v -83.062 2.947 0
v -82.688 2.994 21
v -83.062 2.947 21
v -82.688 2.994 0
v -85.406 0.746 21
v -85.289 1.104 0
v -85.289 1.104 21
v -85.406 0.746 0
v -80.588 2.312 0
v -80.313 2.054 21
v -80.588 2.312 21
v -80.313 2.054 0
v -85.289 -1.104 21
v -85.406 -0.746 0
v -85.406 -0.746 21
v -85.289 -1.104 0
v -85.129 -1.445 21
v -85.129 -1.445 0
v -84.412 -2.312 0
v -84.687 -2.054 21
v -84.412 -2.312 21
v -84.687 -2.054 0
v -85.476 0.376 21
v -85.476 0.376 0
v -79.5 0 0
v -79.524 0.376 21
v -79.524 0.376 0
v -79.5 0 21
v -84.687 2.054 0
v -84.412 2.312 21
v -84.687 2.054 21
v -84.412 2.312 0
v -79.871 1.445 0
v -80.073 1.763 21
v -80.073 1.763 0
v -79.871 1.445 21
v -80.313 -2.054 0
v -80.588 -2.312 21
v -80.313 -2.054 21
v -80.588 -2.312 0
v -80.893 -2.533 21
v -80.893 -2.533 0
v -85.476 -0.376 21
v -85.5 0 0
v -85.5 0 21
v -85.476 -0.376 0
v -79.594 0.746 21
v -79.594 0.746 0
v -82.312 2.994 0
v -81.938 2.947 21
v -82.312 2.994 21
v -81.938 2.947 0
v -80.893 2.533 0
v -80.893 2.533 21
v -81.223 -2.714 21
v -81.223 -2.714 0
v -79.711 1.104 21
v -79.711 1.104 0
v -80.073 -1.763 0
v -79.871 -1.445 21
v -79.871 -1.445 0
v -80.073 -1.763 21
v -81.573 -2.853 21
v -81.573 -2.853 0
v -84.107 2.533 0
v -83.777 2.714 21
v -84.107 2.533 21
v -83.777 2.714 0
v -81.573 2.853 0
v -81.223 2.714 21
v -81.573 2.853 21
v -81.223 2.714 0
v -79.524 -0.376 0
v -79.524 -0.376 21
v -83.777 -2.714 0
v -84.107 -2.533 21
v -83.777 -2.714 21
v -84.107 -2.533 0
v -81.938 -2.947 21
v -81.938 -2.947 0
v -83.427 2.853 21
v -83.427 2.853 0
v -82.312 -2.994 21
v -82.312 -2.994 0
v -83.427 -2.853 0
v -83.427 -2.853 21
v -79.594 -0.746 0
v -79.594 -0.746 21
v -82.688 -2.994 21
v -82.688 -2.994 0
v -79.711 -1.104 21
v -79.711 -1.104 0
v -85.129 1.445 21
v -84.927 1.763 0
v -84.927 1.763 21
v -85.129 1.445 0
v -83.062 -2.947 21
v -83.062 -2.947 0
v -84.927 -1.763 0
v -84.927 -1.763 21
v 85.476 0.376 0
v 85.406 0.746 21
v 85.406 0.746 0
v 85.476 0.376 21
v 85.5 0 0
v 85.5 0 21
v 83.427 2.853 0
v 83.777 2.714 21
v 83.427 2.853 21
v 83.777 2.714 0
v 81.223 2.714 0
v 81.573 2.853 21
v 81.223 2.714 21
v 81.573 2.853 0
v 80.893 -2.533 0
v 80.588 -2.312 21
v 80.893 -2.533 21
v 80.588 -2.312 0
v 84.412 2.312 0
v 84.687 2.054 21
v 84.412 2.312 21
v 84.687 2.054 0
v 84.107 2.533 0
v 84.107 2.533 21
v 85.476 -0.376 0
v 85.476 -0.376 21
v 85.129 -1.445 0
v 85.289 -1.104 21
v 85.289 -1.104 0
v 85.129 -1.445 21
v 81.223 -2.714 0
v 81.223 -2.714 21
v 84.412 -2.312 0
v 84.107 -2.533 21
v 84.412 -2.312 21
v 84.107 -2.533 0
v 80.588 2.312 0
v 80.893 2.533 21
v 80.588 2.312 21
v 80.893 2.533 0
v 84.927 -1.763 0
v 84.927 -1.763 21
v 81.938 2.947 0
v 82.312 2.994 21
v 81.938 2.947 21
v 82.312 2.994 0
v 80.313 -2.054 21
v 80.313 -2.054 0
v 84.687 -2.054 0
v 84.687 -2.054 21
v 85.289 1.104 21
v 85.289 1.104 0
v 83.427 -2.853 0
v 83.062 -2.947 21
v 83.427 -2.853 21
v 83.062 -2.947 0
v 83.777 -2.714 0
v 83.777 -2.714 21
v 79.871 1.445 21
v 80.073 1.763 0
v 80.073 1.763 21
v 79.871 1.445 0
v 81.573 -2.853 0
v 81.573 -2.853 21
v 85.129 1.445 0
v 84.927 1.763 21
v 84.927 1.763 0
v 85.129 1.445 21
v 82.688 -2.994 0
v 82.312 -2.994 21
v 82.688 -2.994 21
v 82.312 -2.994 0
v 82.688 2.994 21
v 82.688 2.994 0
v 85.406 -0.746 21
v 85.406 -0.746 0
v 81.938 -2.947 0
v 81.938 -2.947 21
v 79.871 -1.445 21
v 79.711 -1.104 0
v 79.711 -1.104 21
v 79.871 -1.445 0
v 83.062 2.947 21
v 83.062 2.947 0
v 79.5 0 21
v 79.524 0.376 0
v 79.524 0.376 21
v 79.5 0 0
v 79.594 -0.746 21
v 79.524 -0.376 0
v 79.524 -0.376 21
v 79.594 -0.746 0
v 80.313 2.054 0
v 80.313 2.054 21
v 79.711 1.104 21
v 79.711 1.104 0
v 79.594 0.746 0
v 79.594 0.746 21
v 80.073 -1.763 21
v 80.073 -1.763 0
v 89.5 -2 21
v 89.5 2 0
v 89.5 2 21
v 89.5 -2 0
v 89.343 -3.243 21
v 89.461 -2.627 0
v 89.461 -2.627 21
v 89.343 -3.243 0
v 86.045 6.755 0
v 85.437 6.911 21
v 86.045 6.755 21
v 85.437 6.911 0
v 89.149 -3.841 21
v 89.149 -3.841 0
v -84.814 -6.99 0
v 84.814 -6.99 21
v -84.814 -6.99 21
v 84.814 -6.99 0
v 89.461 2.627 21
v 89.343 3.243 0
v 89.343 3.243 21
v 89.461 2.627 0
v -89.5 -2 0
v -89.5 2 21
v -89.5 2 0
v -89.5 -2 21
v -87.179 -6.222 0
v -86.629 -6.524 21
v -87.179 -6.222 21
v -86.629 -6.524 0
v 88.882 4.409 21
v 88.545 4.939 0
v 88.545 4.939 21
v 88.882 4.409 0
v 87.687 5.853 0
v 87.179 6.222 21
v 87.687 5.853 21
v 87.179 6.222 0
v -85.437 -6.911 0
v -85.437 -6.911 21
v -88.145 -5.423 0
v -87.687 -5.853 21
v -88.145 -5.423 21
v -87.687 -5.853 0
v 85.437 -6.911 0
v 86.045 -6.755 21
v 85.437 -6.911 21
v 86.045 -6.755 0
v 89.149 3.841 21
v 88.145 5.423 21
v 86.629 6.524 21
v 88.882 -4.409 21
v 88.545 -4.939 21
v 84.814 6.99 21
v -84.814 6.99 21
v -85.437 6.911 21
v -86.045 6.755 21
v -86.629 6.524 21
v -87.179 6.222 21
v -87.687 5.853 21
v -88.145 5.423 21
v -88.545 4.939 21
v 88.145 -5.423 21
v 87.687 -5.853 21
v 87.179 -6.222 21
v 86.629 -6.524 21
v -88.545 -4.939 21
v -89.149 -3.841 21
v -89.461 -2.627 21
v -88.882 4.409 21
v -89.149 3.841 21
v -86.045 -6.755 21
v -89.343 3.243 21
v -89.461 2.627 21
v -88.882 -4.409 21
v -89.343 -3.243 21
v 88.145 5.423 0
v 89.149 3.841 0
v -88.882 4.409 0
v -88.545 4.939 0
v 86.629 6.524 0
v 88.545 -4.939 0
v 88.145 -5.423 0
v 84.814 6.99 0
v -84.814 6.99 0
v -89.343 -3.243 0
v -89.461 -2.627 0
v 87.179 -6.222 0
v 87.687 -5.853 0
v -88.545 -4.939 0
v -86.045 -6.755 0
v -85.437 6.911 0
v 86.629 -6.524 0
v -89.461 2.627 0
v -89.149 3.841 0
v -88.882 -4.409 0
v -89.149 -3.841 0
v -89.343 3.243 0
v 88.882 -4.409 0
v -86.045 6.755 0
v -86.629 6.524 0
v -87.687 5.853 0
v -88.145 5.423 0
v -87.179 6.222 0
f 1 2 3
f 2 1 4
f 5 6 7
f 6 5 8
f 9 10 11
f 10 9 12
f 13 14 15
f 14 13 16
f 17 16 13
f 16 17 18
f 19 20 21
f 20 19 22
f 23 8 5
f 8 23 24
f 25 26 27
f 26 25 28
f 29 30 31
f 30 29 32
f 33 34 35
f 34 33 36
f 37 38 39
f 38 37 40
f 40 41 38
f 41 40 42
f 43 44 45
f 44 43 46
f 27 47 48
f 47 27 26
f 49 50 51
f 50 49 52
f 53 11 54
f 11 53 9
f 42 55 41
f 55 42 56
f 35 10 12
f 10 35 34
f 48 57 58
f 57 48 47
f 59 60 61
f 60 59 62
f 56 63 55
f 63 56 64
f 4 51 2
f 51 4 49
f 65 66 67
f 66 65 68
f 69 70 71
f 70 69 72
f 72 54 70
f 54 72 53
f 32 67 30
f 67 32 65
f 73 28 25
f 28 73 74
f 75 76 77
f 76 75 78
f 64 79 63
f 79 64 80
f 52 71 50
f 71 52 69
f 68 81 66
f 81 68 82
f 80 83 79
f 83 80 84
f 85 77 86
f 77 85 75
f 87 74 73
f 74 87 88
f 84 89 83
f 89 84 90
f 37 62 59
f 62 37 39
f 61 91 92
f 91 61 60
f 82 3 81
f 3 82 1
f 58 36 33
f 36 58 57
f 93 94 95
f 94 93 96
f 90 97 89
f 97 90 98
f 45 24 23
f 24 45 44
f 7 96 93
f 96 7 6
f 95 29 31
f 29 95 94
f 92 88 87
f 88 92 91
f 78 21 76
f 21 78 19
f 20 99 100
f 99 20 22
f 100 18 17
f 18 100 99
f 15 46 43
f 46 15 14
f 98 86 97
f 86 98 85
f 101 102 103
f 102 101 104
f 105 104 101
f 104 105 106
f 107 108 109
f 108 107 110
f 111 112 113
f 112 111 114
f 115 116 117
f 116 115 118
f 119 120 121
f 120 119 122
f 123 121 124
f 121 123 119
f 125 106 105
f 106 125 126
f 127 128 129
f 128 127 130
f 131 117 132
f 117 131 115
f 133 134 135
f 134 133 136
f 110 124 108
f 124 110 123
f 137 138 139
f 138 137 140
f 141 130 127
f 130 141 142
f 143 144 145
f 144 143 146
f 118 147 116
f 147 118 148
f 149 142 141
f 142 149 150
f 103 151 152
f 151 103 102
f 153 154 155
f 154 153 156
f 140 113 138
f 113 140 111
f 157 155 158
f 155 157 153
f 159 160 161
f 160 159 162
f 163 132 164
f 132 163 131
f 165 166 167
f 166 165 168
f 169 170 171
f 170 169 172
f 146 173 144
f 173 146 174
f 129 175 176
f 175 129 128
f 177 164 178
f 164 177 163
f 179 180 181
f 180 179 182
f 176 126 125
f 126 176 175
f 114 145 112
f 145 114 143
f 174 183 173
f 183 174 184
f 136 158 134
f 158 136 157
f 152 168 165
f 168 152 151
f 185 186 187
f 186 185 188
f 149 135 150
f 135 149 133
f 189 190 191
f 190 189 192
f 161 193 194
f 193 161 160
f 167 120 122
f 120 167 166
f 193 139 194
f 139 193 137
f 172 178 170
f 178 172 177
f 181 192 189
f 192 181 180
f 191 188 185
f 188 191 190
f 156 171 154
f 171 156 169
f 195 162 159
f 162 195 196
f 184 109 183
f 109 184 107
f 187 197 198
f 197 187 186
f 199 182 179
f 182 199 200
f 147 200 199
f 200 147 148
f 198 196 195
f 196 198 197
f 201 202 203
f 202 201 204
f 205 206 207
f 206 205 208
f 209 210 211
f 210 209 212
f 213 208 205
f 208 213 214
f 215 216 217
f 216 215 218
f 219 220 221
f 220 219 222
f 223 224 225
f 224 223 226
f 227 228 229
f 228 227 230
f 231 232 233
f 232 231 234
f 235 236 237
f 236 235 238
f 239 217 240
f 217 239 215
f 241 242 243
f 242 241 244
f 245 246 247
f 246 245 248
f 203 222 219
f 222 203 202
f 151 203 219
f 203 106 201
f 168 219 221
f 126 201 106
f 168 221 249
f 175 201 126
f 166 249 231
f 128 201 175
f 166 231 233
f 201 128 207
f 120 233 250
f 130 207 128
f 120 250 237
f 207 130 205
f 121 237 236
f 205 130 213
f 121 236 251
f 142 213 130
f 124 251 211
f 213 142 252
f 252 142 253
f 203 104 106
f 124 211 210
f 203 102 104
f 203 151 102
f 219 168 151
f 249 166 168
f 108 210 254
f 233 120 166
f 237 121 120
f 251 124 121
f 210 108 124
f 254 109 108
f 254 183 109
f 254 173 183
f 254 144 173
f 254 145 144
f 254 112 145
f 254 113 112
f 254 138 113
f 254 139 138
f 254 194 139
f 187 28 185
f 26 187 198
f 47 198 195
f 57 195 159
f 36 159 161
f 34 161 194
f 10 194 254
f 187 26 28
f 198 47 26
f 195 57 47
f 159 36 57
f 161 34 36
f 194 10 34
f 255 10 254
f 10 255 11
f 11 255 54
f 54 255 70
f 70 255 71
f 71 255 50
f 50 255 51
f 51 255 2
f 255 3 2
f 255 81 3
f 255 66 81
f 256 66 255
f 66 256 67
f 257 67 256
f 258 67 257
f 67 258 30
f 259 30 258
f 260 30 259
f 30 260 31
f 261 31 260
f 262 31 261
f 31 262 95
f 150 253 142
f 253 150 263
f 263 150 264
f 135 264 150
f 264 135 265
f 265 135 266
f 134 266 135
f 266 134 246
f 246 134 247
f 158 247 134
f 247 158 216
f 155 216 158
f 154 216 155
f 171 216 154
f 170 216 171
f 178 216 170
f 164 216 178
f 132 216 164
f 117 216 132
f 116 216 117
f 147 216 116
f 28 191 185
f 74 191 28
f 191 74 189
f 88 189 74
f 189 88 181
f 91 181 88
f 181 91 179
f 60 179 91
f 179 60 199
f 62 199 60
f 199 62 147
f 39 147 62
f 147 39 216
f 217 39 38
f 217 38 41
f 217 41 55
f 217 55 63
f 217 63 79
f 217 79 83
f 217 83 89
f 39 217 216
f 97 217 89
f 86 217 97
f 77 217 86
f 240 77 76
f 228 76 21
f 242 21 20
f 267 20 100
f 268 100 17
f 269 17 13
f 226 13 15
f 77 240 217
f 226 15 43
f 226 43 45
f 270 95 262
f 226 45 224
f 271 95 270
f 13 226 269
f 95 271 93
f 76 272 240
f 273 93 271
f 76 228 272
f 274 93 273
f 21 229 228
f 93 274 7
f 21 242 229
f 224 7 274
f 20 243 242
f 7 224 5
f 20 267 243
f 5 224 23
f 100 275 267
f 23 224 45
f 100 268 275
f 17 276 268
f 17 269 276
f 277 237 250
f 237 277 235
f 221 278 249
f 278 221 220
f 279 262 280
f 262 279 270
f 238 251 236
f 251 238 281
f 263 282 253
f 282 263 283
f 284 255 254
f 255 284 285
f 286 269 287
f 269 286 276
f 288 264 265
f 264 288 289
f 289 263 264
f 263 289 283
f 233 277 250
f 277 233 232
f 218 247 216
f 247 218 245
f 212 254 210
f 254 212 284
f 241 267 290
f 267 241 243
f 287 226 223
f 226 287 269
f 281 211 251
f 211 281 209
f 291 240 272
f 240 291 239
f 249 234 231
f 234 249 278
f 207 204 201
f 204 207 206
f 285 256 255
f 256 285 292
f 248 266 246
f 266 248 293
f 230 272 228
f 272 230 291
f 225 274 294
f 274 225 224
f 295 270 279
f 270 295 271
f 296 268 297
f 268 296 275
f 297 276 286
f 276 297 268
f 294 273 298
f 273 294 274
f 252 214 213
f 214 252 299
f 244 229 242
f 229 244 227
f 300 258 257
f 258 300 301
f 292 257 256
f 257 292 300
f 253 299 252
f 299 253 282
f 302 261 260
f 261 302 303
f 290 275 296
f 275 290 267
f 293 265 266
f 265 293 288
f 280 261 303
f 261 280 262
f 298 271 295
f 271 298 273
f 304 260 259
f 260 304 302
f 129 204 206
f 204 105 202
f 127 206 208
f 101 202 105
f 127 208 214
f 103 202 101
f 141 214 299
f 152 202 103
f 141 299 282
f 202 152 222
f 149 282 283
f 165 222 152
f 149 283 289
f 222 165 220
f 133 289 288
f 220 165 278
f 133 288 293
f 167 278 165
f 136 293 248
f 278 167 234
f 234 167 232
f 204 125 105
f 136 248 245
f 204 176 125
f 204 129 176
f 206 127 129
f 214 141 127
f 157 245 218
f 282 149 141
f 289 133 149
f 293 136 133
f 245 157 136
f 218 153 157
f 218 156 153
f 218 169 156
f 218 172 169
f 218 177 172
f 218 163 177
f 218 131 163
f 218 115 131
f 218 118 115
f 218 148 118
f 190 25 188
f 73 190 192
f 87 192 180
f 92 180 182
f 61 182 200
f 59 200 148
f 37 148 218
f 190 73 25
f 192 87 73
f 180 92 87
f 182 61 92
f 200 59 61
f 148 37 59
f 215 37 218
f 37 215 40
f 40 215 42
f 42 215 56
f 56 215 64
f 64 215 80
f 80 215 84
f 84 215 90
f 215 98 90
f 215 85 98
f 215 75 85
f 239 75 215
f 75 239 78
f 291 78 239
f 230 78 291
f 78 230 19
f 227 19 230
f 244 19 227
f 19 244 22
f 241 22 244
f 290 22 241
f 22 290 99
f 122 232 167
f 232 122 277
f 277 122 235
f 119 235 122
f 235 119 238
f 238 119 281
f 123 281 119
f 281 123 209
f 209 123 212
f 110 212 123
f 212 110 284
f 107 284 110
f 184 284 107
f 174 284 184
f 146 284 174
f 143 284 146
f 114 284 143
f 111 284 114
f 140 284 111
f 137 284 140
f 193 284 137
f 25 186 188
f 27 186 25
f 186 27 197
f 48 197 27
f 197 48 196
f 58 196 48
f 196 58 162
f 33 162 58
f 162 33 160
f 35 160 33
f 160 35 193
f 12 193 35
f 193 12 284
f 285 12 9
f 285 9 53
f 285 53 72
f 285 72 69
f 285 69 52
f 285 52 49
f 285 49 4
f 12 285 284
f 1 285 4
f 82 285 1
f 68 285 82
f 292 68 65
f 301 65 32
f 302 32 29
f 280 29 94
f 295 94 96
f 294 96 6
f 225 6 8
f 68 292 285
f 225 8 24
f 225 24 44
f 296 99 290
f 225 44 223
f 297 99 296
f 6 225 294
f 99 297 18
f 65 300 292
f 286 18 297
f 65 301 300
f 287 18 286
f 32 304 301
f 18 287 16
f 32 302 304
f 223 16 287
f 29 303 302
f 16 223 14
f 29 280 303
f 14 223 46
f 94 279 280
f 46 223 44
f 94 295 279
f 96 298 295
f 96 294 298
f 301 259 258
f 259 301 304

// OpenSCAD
$fn = 50;


difference() {
	union() {
		hull() {
			translate(v = [-84.5000000000, 2.0000000000, 0]) {
				cylinder(h = 21, r = 5);
			}
			translate(v = [84.5000000000, 2.0000000000, 0]) {
				cylinder(h = 21, r = 5);
			}
			translate(v = [-84.5000000000, -2.0000000000, 0]) {
				cylinder(h = 21, r = 5);
			}
			translate(v = [84.5000000000, -2.0000000000, 0]) {
				cylinder(h = 21, r = 5);
			}
		}
	}
	union() {
		translate(v = [-82.5000000000, 0.0000000000, -100.0000000000]) {
			cylinder(h = 200, r = 3.0000000000);
		}
		translate(v = [-82.5000000000, 0.0000000000, -100.0000000000]) {
			cylinder(h = 200, r = 3.0000000000);
		}
		translate(v = [82.5000000000, 0.0000000000, -100.0000000000]) {
			cylinder(h = 200, r = 3.0000000000);
		}
		translate(v = [82.5000000000, 0.0000000000, -100.0000000000]) {
			cylinder(h = 200, r = 3.0000000000);
		}
	}
}
